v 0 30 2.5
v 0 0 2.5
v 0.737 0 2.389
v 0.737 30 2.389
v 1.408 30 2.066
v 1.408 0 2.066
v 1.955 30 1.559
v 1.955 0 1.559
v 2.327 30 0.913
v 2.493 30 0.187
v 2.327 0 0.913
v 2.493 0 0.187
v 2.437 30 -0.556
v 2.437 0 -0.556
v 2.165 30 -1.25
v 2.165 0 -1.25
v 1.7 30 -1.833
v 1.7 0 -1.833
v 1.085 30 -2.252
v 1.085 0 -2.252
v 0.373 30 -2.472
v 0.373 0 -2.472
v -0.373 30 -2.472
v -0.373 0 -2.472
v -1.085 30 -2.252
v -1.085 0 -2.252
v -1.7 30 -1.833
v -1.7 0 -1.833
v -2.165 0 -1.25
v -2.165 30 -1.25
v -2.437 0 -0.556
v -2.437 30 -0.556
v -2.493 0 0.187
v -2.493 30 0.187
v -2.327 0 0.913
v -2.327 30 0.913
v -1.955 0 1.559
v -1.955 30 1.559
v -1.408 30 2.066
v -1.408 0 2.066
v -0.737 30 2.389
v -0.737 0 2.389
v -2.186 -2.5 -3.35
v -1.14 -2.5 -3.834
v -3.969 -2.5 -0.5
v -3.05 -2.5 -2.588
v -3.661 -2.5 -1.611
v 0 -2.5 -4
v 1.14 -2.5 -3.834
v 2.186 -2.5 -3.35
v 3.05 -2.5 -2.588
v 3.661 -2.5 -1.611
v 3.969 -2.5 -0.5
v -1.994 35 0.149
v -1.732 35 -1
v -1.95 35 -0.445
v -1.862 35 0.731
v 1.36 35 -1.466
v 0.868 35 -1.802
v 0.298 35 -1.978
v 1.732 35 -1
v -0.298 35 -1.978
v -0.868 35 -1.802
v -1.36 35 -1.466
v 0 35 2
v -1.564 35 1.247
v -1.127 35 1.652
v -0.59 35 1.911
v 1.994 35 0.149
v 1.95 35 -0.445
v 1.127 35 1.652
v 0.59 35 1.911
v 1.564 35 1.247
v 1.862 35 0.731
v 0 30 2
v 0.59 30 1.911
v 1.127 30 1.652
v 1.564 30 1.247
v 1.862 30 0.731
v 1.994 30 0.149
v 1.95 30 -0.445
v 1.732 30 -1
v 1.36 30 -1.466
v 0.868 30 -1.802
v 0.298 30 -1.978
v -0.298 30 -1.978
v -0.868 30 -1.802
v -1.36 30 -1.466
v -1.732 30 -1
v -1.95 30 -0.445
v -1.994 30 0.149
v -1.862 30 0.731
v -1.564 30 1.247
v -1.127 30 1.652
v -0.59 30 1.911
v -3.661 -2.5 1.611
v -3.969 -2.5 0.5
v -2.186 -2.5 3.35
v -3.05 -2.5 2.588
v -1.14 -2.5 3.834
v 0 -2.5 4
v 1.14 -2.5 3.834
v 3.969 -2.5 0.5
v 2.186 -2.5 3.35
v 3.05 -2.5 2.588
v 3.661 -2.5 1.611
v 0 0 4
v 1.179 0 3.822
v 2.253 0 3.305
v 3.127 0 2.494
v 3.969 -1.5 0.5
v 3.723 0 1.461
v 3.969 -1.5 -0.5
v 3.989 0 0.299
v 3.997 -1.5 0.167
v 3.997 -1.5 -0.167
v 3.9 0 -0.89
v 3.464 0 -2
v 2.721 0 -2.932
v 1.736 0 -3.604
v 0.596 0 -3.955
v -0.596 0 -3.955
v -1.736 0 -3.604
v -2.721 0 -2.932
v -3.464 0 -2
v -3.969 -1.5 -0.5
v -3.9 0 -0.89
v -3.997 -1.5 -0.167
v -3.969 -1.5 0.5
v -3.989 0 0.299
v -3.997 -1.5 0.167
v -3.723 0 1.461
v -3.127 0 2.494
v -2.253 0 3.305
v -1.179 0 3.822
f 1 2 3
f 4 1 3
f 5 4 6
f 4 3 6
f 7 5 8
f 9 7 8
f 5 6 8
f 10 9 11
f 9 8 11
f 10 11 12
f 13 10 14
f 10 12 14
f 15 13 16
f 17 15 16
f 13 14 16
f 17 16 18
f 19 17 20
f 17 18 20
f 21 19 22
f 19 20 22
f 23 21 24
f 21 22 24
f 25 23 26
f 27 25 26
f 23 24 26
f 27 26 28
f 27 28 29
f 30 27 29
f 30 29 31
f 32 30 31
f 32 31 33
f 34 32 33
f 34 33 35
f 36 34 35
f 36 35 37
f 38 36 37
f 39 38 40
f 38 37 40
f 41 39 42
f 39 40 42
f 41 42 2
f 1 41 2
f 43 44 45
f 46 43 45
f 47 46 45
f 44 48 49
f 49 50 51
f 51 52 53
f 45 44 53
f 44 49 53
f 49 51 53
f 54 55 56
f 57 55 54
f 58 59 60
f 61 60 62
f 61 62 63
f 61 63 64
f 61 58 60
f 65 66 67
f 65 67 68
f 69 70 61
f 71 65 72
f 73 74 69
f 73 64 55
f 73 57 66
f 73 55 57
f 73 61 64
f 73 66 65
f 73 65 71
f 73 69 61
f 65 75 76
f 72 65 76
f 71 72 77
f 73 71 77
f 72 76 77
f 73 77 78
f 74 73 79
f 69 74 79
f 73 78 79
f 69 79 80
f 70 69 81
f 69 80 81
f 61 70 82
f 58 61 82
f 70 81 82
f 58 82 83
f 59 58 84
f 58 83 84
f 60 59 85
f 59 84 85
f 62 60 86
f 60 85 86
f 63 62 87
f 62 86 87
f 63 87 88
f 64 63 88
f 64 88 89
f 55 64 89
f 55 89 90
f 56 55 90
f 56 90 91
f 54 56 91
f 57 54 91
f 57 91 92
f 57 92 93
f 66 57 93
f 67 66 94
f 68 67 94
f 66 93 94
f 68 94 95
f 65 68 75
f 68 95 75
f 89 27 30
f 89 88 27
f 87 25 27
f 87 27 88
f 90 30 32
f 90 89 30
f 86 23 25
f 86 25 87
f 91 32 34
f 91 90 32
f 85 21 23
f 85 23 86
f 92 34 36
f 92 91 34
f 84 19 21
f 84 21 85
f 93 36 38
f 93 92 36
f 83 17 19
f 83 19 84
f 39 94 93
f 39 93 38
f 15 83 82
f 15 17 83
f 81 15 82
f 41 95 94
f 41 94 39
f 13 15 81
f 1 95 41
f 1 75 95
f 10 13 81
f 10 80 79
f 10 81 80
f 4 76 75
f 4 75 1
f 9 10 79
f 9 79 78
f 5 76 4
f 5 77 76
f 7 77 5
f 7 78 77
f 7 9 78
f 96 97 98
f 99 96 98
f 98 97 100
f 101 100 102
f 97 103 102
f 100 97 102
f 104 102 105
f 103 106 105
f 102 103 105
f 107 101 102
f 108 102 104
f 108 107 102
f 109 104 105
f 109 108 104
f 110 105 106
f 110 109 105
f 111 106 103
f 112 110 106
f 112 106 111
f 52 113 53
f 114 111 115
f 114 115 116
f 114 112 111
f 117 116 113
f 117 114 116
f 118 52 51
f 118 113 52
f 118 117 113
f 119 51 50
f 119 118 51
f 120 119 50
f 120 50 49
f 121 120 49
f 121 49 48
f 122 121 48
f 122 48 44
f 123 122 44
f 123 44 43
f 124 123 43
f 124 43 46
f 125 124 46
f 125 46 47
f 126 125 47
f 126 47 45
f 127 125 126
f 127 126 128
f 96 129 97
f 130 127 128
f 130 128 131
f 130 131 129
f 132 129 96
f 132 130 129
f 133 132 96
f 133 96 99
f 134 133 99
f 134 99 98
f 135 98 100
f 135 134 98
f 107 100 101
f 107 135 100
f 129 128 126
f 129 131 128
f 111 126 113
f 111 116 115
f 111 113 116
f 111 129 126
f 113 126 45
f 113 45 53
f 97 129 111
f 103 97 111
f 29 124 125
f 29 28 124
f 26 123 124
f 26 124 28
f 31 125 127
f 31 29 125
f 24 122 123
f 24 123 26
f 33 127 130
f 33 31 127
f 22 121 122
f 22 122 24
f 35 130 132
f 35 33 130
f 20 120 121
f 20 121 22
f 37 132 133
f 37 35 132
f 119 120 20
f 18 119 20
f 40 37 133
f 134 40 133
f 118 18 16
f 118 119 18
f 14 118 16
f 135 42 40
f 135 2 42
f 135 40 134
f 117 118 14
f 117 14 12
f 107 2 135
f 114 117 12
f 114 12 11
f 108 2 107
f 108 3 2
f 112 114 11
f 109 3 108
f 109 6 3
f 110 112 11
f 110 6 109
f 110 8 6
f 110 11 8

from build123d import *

# Parameters (mm, degrees)
SKETCH_1_R               = 4
EXTRUDE_1_DEPTH          = 2.5
SKETCH_2_R               = 2.5
EXTRUDE_2_DEPTH          = 30
SKETCH_3_R               = 2
EXTRUDE_3_DEPTH          = 5
CUT_EXTRUDE_1_DEPTH      = 38.924266638
CUT_EXTRUDE_1_DEPTH_BACK = 1
SKETCH_4_W               = 8
SKETCH_4_H               = 1


with BuildPart() as part:
    # 草图1 → 凸台-拉伸1 (new body)
    with BuildSketch(Plane(origin=(0, 0, 0), x_dir=(1, 0, 0), z_dir=(0, 1, 0))):
        Circle(SKETCH_1_R)
    extrude(amount=-EXTRUDE_1_DEPTH)

    # 草图2 → 凸台-拉伸2 (add)
    with BuildSketch(Plane(origin=(0, 0, 0), x_dir=(1, 0, 0), z_dir=(0, 1, 0))):
        Circle(SKETCH_2_R)
    extrude(amount=EXTRUDE_2_DEPTH)

    # 草图3 → 凸台-拉伸3 (add)
    with BuildSketch(Plane(origin=(0, 30, 0), x_dir=(1, 0, 0), z_dir=(0, 1, 0))):
        Circle(SKETCH_3_R)
    extrude(amount=EXTRUDE_3_DEPTH)

    # 草图4 → 切除-拉伸-薄壁1 (cut, two sides: drawn at the far end of the back side and taken through both)
    with BuildSketch(Plane.XZ.offset(2.5).offset(-CUT_EXTRUDE_1_DEPTH_BACK)):
        Rectangle(SKETCH_4_W, SKETCH_4_H)
    extrude(amount=CUT_EXTRUDE_1_DEPTH + CUT_EXTRUDE_1_DEPTH_BACK, mode=Mode.SUBTRACT)


solid = part.part
